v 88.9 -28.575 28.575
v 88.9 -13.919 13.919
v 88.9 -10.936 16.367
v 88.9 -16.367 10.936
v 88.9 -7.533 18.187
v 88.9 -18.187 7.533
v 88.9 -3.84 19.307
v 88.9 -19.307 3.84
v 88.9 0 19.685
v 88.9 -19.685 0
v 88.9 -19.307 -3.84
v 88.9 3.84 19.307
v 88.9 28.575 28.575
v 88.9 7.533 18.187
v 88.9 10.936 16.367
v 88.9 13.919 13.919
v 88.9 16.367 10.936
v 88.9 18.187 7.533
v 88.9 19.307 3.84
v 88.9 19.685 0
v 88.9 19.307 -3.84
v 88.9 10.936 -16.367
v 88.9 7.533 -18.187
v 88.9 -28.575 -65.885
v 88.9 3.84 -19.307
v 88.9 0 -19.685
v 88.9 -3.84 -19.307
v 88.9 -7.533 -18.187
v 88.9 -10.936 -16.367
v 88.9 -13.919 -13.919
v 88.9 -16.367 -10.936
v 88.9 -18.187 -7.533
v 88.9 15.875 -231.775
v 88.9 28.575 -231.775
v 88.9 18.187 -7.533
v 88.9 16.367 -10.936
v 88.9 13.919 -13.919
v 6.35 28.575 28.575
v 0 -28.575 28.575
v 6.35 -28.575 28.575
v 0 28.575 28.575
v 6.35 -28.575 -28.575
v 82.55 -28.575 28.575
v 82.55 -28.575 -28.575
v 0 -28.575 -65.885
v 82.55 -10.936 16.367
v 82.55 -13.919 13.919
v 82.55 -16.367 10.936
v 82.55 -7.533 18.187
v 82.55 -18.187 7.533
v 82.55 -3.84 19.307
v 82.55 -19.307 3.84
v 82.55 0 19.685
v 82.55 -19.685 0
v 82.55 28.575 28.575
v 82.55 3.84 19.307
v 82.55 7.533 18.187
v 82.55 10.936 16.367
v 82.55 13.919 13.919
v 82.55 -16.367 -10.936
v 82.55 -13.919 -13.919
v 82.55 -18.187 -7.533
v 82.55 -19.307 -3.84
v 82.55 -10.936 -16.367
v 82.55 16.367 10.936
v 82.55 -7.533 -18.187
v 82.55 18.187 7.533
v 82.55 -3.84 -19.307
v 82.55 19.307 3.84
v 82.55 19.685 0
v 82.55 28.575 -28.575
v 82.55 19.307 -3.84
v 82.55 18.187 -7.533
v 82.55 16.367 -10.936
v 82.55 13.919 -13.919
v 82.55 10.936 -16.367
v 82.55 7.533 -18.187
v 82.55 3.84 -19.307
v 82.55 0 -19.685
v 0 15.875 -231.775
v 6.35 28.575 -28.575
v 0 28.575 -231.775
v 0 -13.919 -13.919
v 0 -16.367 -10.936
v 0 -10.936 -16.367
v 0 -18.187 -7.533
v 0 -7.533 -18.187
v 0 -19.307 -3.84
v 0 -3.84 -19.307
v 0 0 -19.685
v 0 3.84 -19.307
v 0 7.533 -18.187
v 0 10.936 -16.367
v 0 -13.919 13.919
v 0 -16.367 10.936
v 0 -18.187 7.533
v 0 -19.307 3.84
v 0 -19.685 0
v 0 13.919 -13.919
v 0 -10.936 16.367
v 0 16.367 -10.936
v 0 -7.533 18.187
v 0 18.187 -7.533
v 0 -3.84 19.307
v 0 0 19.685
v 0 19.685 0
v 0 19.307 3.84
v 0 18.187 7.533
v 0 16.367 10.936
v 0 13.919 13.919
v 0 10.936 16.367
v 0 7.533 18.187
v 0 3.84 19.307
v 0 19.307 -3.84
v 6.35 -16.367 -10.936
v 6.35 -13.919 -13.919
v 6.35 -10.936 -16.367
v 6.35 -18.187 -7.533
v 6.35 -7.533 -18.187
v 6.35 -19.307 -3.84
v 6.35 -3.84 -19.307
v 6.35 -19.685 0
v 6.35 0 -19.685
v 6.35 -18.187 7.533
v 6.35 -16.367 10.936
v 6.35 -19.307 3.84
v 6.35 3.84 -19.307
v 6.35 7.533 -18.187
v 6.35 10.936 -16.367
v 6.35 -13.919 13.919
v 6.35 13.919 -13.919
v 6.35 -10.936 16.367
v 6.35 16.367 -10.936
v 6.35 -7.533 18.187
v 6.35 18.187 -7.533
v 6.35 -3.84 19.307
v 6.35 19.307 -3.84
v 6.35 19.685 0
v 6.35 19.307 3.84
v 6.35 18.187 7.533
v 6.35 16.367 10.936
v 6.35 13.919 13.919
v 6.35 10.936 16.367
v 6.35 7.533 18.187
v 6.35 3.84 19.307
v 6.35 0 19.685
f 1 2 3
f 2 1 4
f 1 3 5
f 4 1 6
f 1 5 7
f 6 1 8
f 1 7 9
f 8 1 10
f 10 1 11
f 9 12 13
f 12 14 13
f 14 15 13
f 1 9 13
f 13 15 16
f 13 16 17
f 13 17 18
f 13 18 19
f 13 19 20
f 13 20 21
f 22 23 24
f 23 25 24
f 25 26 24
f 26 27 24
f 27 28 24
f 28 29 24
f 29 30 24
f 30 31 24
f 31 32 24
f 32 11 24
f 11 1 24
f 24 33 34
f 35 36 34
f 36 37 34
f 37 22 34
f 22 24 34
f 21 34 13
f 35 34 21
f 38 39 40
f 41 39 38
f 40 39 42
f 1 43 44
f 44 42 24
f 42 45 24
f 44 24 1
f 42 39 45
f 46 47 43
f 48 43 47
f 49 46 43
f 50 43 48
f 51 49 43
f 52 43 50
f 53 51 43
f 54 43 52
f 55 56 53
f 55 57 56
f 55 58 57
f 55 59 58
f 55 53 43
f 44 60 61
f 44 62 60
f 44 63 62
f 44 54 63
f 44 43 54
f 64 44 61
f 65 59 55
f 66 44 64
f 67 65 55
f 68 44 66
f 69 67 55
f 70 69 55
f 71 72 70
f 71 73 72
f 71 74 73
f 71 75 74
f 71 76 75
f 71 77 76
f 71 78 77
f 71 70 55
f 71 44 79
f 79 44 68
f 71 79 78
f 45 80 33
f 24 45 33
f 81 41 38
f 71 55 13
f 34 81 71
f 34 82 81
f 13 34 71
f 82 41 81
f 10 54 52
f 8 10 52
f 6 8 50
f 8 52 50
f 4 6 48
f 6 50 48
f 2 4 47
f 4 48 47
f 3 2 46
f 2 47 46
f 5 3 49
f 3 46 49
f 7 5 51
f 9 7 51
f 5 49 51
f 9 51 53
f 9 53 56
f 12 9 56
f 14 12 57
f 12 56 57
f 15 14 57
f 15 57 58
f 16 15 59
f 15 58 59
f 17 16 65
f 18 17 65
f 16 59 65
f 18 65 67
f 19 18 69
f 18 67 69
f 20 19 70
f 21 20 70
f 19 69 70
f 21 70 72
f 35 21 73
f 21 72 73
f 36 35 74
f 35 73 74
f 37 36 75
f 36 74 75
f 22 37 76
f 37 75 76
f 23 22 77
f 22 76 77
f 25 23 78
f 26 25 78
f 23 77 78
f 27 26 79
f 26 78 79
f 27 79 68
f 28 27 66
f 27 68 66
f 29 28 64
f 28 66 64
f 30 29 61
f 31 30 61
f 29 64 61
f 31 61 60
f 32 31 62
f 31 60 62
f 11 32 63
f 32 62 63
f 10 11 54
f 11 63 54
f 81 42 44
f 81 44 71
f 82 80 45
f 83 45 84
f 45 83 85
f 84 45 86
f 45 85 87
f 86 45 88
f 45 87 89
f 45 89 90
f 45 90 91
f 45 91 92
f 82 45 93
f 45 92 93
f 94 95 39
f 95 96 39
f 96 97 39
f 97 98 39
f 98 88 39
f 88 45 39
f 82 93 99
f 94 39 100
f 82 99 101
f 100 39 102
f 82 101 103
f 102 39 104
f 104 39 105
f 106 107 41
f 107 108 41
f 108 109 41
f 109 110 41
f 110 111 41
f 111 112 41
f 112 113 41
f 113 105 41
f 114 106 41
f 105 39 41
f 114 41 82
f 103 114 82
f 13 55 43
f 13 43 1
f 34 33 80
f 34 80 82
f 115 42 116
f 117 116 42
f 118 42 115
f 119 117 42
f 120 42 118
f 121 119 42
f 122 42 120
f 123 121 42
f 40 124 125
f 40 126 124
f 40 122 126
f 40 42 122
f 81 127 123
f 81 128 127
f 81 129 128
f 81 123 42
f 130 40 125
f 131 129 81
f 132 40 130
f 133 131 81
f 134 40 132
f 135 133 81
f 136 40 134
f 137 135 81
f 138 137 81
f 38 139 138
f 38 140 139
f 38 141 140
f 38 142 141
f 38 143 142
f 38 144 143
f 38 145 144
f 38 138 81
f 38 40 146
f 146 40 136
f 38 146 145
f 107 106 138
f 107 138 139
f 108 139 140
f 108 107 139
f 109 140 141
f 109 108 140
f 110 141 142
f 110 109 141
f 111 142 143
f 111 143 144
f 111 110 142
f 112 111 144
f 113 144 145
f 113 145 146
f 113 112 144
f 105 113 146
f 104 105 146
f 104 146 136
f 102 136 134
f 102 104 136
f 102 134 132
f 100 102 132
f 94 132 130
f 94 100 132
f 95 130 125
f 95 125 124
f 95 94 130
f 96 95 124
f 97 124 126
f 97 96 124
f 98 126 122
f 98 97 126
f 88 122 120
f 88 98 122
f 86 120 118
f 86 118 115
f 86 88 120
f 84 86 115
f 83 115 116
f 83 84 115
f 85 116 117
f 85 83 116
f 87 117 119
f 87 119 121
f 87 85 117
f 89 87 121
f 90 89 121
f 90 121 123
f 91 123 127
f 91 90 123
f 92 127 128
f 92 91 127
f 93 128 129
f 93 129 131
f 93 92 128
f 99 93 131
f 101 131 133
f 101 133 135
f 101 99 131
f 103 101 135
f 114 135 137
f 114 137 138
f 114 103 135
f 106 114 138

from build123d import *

# Parameters (mm, degrees)
F0_W     = 57.15
F0_H     = 203.2
F1_DEPTH = 88.9
F0_H_2   = 57.15
F0_R     = 19.685
F2_DEPTH = 6.35
F3_W     = 6.35
F3_H     = 57.15
F4_DEPTH = 57.15
F5_R     = 19.685
F6_DEPTH = 6.35
F7_SIZE2 = 165.8896583964
F7_SIZE  = 44.45


with BuildPart() as f1:
    # F0 (on Right) → F1 (new body)
    with BuildSketch(Plane.YZ):
        with Locations((0, -130.175)):
            Rectangle(F0_W, F0_H)
    extrude(amount=F1_DEPTH)

    # F0 (on Right) → F2 (join)
    with BuildSketch(Plane.YZ):
        Rectangle(F0_W, F0_H_2)
        Circle(F0_R, mode=Mode.SUBTRACT)
    extrude(amount=F2_DEPTH)

    # F3 (on face) → F4 (join)
    with BuildSketch(Plane.XY.offset(-28.575)):
        with Locations((85.725, 0)):
            Rectangle(F3_W, F3_H)
    extrude(amount=F4_DEPTH)

    # F5 (on face) → F6 (cut)
    with BuildSketch(Plane(origin=(82.55, 0, 0), x_dir=(0, -1, 0), z_dir=(-1, 0, 0))):
        Circle(F5_R)
    extrude(amount=-F6_DEPTH, mode=Mode.SUBTRACT)

    # F7
    f7_edges = [f1.edges().sort_by_distance(p)[0] for p in [
        (44.45, -28.575, -231.775),
    ]]
    f7_side = f1.faces().sort_by_distance((44.45, 0, -231.775))[0]
    chamfer(f7_edges, length=F7_SIZE, length2=F7_SIZE2, reference=f7_side)


solid = f1.part
